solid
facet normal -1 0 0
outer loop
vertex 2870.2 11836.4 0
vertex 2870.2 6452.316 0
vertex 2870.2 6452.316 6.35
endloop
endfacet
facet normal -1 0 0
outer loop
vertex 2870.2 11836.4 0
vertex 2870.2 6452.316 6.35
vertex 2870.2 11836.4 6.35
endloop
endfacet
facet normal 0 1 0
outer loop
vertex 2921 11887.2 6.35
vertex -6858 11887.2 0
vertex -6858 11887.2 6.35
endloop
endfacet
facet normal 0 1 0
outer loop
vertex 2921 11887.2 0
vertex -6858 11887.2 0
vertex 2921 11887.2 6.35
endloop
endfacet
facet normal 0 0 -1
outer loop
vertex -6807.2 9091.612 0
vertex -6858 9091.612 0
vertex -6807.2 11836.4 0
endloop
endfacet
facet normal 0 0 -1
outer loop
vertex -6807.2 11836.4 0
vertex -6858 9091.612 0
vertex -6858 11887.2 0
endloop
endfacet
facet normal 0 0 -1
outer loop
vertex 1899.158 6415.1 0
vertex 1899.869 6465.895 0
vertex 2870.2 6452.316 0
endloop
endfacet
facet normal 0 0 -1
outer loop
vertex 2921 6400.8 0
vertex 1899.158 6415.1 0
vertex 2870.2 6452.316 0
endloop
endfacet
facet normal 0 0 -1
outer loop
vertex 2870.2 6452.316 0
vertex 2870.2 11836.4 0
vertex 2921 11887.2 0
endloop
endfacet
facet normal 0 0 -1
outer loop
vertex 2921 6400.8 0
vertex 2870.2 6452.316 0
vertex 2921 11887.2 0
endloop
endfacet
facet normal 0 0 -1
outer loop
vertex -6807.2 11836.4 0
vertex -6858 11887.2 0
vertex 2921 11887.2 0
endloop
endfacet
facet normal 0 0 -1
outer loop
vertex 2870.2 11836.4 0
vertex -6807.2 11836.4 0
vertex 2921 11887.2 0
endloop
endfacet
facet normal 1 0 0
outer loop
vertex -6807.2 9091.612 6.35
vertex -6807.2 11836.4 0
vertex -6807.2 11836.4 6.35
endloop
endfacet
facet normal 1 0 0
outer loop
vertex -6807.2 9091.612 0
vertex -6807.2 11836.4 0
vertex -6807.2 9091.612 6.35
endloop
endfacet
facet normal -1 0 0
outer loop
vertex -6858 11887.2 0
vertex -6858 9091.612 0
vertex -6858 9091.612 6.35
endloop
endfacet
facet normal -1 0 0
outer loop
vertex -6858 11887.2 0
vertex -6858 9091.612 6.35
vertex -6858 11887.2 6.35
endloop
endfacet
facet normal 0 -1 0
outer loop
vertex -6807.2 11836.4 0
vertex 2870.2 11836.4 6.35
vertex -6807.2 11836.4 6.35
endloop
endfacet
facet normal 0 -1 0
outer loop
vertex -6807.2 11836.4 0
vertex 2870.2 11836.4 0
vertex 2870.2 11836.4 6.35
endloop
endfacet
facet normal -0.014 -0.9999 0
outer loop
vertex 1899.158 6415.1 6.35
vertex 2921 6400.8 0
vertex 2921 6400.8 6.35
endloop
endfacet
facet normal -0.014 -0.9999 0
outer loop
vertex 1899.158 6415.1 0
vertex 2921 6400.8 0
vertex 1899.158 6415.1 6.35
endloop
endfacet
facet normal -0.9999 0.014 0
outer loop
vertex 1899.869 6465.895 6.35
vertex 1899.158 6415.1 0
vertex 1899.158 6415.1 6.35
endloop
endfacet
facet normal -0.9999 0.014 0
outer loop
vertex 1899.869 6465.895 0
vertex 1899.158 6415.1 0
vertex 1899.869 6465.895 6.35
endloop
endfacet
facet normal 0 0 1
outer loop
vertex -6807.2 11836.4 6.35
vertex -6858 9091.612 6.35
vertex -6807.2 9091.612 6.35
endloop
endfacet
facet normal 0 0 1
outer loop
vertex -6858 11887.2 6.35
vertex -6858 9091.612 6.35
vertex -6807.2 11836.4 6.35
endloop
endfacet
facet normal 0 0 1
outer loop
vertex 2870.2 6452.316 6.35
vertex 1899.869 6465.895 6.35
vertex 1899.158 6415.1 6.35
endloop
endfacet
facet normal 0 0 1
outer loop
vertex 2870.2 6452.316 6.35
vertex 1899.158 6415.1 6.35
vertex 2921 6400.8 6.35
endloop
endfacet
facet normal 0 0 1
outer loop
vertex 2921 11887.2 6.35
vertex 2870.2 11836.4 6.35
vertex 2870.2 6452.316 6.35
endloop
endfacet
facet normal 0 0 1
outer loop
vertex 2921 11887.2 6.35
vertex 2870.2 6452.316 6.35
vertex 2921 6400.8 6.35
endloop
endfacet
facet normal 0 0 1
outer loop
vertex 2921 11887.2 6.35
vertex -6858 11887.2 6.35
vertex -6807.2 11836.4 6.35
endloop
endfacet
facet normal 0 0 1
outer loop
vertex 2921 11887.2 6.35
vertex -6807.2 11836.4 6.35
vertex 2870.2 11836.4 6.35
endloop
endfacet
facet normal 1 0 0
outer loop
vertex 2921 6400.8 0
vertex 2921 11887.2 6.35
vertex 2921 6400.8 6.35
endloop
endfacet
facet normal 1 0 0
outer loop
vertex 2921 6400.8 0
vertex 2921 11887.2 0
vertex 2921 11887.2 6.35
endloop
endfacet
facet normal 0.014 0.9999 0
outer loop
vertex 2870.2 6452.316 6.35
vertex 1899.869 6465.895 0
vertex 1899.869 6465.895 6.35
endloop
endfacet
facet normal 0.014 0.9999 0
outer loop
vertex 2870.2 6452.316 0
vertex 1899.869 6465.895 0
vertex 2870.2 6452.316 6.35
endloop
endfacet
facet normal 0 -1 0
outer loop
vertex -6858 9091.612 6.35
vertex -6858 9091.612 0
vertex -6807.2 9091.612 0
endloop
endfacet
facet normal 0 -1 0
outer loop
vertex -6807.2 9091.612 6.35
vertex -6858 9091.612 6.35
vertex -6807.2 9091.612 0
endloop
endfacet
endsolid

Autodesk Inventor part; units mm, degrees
ref_plane "YZ Plane" through (0, 0, 0) normal (1, 0, 0) x (0, 1, 0)
ref_plane "XZ Plane" through (0, 0, 0) normal (0, 1, 0) x (-1, 0, 0)
ref_plane "XY Plane" through (0, 0, 0) normal (0, 0, 1) x (1, 0, 0)
ref_plane "Work Plane1" through (0, 0, 0) normal (0, 0, 1) x (1, 0, 0)
sketch "Sketch1" plane through (0, 0, 0) normal (0, 0, 1) x (1, 0, 0)
  line L0 (-6858, 11887.2) -> (-2286, 11887.2) projected
  line L1 (-6858, -11887.2) -> (-6858, 11887.2) projected
  line L2 (2286, 11887.2) -> (2286, -11887.2) projected
  line L3 (-2286, 11887.2) -> (2286, 11887.2) projected
  line L4 (-6858, 11887.2) -> (2921, 11887.2)
  line L5 (2921, 11887.2) -> (2921, 6400.8)
  line L6 (-6858, 9091.6125) -> (2286, 9091.6125) projected
  line L7 (-6858, 11887.2) -> (-6858, 9091.6125)
  line L8 (1899.158, 4586.3002) -> (1899.158, 6415.1002) projected
  line L9 (2921, 6400.8) -> (1899.158, 6415.1002)
  line L10 (1899.8689, 6465.8952) -> (2870.2, 6452.3159)
  line L11 (2870.2, 6452.3159) -> (2870.2, 11836.4)
  line L12 (2870.2, 11836.4) -> (-6807.2, 11836.4)
  line L13 (-6807.2, 11836.4) -> (-6807.2, 9091.6125)
  line L14 (1899.158, 6415.1002) -> (1899.8689, 6465.8952)
  line L15 (-6858, 9091.6125) -> (-6807.2, 9091.6125)
  line L16 (1899.158, 6415.1002) -> (1899.8689, 6465.8952)
  point P0 (0, 0)
  dimension "d0" = 9779
  dimension "d1" = 5486.4
  dimension "d2" = 50.8
extrude "Extrusion1" add sketch "Sketch1" along normal blind 6.35 contours L0 L3 L2 L12 L13 L6 L1 | L4 L5 L9 L2 L10 L11 L12 | L2 L9 L14 L10
properties part number "Trim-Blue_03"
